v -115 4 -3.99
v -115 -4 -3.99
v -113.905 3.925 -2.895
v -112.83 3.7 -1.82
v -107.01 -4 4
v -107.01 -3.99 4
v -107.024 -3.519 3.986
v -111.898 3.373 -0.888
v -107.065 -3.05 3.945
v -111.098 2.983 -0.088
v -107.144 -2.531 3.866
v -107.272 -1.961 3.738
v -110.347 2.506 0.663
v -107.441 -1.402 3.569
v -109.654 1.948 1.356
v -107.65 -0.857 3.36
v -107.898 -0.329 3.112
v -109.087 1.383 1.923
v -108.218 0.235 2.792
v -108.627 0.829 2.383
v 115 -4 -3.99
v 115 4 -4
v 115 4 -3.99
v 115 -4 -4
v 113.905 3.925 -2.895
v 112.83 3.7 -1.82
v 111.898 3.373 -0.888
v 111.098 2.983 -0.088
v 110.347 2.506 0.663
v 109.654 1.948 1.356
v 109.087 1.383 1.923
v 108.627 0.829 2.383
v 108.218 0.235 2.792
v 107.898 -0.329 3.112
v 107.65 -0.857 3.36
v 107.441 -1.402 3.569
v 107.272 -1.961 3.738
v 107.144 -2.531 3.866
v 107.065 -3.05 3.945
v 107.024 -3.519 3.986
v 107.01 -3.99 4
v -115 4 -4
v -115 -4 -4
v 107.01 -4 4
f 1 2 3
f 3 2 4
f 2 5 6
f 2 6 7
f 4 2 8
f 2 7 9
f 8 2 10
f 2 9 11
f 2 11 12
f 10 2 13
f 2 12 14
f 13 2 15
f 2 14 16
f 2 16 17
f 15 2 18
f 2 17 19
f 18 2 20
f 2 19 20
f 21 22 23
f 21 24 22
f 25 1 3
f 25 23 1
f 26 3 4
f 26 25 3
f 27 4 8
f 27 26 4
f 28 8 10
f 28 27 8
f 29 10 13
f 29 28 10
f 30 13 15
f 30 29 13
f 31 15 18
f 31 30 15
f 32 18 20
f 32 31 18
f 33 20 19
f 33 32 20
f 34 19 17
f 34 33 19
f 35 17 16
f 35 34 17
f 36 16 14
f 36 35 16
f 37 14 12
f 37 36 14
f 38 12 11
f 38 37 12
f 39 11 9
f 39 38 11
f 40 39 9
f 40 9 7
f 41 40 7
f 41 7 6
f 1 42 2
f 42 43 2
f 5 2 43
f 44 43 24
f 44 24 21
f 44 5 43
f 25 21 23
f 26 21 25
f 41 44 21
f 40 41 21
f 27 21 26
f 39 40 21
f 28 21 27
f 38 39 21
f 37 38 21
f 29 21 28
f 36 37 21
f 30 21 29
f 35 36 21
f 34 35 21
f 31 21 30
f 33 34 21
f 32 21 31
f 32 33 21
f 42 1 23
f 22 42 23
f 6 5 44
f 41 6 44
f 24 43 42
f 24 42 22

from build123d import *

# Parameters (mm, degrees)
SKETCH001_W  = 230
SKETCH001_H  = 8
PAD001_DEPTH = 4
CHAMFER_SIZE = 7.99
FILLET_R     = 7.99


with BuildPart() as part:
    # Sketch001 → Pad001 (new body, symmetric)
    with BuildSketch(Plane.XZ):
        Rectangle(SKETCH001_W, SKETCH001_H)
    extrude(amount=PAD001_DEPTH, both=True)

    # Chamfer
    chamfer_edges = [part.edges().sort_by_distance(p)[0] for p in [
        (115, 0, 4),
        (-115, 0, 4),
    ]]
    chamfer(chamfer_edges, length=CHAMFER_SIZE)

    # Fillet
    fillet_edges = [part.edges().sort_by_distance(p)[0] for p in [
        (0, 4, 4),
    ]]
    fillet(fillet_edges, radius=FILLET_R)


solid = part.part
